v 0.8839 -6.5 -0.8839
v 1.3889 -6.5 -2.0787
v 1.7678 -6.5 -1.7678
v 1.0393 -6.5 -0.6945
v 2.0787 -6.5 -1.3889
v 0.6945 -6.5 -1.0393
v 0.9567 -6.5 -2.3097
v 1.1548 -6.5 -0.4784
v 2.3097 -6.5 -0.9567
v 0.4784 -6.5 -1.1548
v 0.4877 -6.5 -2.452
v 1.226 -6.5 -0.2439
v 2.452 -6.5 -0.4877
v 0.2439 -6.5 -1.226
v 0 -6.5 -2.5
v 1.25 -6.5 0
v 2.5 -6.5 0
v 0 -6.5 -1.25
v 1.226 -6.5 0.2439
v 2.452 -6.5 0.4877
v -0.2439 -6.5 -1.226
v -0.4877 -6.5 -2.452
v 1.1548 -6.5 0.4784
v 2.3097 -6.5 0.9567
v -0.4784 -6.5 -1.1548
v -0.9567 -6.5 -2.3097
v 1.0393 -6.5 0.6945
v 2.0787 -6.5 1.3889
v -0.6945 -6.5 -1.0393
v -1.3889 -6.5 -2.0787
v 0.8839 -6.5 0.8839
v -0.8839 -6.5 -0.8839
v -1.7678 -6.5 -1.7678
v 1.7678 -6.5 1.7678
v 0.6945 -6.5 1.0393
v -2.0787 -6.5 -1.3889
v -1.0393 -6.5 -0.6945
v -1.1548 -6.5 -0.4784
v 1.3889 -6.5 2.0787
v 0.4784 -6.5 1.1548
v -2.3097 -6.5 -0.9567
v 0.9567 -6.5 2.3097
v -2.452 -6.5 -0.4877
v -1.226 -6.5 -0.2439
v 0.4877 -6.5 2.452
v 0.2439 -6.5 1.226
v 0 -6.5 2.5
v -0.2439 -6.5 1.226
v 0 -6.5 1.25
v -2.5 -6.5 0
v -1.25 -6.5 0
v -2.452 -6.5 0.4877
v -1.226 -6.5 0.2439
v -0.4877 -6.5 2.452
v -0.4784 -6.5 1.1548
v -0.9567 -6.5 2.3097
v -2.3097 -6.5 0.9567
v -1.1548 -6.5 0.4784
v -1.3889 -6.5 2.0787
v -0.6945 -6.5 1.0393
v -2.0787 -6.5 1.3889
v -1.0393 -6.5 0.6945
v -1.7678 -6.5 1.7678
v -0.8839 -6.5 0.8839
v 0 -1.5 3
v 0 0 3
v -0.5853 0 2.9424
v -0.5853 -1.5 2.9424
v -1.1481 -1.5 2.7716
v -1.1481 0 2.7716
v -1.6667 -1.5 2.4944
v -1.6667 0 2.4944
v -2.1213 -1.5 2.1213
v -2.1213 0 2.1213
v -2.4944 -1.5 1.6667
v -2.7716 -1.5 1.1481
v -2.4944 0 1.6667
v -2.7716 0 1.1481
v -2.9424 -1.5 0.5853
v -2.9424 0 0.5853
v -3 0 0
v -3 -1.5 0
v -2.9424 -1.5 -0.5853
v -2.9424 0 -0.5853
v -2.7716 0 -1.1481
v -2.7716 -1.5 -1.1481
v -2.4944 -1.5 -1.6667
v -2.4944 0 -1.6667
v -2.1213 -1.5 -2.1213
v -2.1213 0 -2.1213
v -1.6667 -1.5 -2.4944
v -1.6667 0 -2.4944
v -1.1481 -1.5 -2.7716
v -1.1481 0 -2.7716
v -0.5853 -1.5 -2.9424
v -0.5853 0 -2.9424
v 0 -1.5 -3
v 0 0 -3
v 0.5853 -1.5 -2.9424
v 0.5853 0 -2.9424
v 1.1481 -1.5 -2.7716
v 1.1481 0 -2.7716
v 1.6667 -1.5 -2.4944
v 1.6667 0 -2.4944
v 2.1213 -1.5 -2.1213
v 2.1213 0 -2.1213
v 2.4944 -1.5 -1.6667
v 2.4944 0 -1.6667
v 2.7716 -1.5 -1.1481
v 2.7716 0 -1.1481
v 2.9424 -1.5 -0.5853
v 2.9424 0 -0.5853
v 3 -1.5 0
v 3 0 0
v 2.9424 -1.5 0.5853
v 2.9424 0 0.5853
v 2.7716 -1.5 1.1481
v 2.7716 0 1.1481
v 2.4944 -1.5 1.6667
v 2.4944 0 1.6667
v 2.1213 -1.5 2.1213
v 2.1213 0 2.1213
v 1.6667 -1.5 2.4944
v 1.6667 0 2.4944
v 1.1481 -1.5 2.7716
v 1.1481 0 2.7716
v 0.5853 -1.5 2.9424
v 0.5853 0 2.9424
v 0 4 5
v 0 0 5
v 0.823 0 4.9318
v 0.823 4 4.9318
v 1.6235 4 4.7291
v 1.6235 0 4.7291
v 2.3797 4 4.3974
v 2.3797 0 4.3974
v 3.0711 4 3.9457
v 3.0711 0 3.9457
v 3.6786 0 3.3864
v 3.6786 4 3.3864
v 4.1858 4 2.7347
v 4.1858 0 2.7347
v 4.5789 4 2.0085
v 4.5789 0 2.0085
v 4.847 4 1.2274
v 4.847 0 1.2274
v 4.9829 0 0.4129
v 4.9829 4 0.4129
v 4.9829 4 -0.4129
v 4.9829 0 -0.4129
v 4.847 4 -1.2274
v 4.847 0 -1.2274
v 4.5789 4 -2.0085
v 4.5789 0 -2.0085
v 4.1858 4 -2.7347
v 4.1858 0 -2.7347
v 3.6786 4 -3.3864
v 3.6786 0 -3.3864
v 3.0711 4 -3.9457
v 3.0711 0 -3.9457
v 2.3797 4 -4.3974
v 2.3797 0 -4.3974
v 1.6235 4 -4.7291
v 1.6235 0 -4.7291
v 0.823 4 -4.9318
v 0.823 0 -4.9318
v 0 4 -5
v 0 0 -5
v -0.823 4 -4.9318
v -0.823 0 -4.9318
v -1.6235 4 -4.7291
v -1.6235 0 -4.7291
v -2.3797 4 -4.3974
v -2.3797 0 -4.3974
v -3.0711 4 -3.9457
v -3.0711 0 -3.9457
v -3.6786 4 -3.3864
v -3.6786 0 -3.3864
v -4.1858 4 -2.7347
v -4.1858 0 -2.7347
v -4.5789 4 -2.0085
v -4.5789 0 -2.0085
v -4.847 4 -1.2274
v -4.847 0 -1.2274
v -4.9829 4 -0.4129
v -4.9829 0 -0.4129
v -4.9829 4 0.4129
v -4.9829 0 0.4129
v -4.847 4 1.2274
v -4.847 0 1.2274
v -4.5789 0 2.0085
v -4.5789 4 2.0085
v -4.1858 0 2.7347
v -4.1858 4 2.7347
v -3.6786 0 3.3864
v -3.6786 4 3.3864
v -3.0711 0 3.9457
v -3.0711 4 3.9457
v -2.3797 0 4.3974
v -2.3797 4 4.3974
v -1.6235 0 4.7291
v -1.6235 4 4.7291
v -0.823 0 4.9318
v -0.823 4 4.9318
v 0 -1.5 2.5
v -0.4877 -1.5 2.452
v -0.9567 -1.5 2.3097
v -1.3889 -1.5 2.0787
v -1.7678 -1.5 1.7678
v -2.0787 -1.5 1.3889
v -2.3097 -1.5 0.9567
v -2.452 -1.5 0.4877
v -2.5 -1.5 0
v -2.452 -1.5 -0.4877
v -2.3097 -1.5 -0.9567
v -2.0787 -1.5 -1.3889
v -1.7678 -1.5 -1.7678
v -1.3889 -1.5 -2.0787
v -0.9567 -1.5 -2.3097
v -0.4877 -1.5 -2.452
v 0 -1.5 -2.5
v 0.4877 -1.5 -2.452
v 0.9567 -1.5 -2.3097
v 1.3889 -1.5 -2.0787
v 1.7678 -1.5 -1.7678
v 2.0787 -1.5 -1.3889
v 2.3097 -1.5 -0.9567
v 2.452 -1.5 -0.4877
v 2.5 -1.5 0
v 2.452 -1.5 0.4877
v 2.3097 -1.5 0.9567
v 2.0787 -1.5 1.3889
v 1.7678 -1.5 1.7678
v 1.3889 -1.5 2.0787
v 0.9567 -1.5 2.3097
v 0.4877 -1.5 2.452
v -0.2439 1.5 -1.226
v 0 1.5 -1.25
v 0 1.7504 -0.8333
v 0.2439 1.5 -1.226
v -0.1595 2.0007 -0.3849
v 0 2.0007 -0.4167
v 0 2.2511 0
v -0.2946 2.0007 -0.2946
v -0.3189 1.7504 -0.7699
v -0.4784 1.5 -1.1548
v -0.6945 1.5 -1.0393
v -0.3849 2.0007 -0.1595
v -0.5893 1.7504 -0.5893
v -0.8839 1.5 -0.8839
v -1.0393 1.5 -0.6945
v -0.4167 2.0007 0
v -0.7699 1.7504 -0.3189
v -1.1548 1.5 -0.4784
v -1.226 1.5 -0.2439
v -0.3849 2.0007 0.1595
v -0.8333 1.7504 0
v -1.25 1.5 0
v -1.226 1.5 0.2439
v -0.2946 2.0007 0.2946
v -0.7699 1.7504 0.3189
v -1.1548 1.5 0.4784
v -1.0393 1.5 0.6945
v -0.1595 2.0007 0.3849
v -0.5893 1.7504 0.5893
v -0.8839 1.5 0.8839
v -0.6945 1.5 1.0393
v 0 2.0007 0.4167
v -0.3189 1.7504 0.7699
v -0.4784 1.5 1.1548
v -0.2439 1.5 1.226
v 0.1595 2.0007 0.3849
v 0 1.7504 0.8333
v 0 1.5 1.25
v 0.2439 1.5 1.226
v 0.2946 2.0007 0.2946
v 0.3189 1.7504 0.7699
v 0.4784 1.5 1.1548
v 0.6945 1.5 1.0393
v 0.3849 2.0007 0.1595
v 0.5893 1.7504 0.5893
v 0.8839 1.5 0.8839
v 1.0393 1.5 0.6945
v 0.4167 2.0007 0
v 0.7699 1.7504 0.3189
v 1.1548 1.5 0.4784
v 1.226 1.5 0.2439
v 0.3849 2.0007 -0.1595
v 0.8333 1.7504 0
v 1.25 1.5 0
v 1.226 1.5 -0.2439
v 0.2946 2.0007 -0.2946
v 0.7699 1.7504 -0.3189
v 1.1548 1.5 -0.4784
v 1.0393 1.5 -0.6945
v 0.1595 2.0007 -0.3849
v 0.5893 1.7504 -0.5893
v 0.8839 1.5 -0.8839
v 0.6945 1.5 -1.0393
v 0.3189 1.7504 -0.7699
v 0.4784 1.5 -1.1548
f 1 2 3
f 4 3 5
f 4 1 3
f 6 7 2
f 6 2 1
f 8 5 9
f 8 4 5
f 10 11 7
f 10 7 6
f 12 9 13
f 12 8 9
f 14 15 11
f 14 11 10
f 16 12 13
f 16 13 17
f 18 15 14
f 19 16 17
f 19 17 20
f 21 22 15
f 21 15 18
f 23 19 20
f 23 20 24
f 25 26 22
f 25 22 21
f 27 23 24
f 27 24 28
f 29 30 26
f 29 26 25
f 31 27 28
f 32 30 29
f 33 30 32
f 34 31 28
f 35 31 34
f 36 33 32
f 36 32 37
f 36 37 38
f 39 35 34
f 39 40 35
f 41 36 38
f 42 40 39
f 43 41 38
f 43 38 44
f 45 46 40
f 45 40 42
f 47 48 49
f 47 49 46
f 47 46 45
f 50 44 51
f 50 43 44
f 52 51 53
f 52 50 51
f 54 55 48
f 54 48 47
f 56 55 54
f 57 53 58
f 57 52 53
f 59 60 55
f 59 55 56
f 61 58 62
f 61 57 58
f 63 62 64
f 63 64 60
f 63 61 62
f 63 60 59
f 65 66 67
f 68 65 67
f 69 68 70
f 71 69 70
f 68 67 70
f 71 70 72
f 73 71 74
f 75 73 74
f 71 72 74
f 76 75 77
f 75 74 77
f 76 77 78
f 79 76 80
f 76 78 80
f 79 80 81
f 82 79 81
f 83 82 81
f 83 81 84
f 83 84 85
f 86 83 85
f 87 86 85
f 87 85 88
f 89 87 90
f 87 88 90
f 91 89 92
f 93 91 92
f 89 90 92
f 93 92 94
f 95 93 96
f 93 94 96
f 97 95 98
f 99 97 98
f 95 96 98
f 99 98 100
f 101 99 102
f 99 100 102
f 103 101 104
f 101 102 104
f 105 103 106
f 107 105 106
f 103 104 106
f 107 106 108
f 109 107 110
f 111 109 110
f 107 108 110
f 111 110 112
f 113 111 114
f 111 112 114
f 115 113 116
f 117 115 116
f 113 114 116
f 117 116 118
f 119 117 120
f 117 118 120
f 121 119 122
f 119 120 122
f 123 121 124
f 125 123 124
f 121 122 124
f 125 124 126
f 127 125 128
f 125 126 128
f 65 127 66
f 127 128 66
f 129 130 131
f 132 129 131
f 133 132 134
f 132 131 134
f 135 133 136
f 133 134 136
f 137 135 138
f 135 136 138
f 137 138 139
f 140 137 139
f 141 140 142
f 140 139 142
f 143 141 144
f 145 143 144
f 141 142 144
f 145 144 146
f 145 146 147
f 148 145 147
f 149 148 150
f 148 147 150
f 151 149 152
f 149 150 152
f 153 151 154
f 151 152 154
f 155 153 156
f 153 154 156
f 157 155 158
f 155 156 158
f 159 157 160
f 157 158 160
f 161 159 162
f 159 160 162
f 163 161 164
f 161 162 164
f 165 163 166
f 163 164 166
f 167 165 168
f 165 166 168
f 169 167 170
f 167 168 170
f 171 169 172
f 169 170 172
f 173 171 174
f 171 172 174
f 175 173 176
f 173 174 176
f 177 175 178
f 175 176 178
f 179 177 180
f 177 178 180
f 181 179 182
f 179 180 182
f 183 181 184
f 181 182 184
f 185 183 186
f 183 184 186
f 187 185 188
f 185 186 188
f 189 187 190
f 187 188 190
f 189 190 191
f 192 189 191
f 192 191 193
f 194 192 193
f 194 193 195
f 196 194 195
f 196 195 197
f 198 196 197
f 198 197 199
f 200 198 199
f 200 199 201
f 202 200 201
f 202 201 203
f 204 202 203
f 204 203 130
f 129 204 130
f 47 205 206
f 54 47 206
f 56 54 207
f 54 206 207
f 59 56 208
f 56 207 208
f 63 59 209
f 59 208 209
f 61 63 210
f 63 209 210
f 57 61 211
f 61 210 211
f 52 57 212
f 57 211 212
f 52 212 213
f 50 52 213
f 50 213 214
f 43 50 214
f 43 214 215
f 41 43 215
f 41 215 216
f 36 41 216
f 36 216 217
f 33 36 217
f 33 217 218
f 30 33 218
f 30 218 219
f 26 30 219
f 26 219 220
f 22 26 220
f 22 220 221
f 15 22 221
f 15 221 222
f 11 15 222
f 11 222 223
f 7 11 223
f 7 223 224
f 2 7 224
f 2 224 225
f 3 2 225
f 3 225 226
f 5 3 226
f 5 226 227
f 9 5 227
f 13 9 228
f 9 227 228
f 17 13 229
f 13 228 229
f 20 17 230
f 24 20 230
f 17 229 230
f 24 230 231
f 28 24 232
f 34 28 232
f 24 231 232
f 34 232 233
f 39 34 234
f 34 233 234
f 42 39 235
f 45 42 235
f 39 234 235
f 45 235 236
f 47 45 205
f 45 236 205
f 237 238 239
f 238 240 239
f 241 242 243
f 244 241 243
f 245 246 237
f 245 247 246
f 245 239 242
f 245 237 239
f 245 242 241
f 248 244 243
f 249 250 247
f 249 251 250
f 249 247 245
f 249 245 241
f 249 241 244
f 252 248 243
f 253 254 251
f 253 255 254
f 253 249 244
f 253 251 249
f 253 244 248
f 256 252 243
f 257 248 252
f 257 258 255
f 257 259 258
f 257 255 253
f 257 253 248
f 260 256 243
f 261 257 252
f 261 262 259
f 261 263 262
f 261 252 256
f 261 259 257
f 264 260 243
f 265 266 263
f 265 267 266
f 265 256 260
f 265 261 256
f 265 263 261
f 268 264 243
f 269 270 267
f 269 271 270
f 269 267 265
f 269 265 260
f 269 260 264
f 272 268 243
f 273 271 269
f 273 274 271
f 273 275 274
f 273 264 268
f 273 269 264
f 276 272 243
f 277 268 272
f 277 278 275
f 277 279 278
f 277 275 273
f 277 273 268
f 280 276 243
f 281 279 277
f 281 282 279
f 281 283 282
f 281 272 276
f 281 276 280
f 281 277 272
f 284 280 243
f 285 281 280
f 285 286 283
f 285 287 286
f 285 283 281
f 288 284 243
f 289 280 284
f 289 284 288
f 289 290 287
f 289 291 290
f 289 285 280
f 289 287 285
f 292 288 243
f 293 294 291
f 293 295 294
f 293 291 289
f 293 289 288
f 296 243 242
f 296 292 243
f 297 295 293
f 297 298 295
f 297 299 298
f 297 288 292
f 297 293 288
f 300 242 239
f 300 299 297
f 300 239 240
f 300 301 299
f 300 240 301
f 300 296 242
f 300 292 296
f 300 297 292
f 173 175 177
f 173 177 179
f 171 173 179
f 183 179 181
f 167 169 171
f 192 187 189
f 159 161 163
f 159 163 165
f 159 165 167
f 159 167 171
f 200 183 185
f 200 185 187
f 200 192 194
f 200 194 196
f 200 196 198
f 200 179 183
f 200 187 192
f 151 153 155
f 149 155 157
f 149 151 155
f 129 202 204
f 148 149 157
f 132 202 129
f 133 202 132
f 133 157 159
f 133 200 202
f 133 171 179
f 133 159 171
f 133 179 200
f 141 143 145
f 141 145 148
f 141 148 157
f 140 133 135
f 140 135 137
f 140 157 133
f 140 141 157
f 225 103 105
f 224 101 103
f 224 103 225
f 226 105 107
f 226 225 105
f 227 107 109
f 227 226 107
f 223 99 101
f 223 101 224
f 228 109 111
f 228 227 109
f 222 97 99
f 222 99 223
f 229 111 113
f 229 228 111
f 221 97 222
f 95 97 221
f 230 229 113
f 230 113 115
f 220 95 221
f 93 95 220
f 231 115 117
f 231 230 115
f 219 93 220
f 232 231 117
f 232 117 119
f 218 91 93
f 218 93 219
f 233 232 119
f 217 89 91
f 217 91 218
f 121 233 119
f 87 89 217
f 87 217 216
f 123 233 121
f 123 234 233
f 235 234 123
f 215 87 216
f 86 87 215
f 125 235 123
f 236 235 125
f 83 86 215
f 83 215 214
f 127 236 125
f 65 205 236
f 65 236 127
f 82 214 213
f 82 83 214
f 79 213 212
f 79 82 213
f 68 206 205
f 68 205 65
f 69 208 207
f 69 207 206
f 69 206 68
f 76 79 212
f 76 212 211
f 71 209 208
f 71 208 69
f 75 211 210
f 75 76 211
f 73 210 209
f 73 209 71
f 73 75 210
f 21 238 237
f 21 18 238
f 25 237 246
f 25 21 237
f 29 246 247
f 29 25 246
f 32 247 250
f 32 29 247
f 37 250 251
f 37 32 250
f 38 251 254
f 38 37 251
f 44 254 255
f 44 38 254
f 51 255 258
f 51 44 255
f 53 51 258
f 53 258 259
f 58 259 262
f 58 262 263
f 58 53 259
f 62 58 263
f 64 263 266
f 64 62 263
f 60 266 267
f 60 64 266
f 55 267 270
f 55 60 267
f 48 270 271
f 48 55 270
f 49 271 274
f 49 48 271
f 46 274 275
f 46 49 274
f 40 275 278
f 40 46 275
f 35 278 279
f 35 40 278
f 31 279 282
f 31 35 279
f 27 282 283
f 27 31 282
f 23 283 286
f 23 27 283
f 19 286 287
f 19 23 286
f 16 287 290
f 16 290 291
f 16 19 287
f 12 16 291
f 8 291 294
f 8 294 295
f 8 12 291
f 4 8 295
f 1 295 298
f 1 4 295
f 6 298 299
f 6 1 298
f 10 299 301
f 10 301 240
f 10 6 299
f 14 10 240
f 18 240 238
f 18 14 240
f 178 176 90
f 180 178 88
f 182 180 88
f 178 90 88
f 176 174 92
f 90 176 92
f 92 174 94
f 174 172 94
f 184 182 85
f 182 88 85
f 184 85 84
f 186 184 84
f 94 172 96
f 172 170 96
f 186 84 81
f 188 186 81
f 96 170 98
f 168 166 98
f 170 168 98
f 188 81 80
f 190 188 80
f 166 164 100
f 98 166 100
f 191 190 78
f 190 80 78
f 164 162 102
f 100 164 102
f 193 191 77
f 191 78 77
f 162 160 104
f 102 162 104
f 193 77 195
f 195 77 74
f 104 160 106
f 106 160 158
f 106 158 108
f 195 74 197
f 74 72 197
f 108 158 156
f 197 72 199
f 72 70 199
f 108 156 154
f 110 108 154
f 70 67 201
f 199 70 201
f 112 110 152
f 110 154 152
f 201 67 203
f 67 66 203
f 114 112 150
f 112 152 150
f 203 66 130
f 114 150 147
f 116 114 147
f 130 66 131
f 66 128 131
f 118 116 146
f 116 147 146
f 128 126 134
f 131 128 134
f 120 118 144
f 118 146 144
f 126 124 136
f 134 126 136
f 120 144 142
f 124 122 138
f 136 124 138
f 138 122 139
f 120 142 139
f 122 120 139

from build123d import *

# Parameters (mm, degrees)
ESBO_O1_R                = 5
RESSALTO_EXTRUS_O1_DEPTH = 4
ESBO_O4_R                = 2.5
RESSALTO_EXTRUS_O2_DEPTH = 6.5
ESBO_O5_R                = 3
RESSALTO_EXTRUS_O4_DEPTH = 1.5


with BuildPart() as part:
    # Esboço1 → Ressalto-extrusão1 (new body)
    with BuildSketch(Plane(origin=(0, 0, 0), x_dir=(1, 0, 0), z_dir=(0, 1, 0))):
        with Locations(Location((0, 0, 0), (0, 0, 270))):
            Circle(ESBO_O1_R)
    extrude(amount=RESSALTO_EXTRUS_O1_DEPTH)

    # Esboço4 → Ressalto-extrusão2 (add)
    with BuildSketch(Plane(origin=(0, 0, 0), x_dir=(-1, 0, 0), z_dir=(0, -1, 0))):
        with Locations(Location((0, 0, 0), (0, 0, 270))):
            Circle(ESBO_O4_R)
    extrude(amount=RESSALTO_EXTRUS_O2_DEPTH)

    # Esboço5 → Ressalto-extrusão4 (add)
    with BuildSketch(Plane.XZ):
        with Locations(Location((0, 0, 0), (0, 0, 90))):
            Circle(ESBO_O5_R)
    extrude(amount=RESSALTO_EXTRUS_O4_DEPTH)

    # Esboço7 → Broca de rosquear para tarraxa de M31 (revolve, cut)
    with BuildSketch(Plane(origin=(0, -6.5, 0), x_dir=(0, 0, -1), z_dir=(1, 0, 0))):
        Polygon((0, 0), (0, 8.751075774), (1.25, 8), (1.25, 0), align=None)
    revolve(axis=Axis((0, -12.85, 0), (0, 1, 0)), mode=Mode.SUBTRACT)


solid = part.part
